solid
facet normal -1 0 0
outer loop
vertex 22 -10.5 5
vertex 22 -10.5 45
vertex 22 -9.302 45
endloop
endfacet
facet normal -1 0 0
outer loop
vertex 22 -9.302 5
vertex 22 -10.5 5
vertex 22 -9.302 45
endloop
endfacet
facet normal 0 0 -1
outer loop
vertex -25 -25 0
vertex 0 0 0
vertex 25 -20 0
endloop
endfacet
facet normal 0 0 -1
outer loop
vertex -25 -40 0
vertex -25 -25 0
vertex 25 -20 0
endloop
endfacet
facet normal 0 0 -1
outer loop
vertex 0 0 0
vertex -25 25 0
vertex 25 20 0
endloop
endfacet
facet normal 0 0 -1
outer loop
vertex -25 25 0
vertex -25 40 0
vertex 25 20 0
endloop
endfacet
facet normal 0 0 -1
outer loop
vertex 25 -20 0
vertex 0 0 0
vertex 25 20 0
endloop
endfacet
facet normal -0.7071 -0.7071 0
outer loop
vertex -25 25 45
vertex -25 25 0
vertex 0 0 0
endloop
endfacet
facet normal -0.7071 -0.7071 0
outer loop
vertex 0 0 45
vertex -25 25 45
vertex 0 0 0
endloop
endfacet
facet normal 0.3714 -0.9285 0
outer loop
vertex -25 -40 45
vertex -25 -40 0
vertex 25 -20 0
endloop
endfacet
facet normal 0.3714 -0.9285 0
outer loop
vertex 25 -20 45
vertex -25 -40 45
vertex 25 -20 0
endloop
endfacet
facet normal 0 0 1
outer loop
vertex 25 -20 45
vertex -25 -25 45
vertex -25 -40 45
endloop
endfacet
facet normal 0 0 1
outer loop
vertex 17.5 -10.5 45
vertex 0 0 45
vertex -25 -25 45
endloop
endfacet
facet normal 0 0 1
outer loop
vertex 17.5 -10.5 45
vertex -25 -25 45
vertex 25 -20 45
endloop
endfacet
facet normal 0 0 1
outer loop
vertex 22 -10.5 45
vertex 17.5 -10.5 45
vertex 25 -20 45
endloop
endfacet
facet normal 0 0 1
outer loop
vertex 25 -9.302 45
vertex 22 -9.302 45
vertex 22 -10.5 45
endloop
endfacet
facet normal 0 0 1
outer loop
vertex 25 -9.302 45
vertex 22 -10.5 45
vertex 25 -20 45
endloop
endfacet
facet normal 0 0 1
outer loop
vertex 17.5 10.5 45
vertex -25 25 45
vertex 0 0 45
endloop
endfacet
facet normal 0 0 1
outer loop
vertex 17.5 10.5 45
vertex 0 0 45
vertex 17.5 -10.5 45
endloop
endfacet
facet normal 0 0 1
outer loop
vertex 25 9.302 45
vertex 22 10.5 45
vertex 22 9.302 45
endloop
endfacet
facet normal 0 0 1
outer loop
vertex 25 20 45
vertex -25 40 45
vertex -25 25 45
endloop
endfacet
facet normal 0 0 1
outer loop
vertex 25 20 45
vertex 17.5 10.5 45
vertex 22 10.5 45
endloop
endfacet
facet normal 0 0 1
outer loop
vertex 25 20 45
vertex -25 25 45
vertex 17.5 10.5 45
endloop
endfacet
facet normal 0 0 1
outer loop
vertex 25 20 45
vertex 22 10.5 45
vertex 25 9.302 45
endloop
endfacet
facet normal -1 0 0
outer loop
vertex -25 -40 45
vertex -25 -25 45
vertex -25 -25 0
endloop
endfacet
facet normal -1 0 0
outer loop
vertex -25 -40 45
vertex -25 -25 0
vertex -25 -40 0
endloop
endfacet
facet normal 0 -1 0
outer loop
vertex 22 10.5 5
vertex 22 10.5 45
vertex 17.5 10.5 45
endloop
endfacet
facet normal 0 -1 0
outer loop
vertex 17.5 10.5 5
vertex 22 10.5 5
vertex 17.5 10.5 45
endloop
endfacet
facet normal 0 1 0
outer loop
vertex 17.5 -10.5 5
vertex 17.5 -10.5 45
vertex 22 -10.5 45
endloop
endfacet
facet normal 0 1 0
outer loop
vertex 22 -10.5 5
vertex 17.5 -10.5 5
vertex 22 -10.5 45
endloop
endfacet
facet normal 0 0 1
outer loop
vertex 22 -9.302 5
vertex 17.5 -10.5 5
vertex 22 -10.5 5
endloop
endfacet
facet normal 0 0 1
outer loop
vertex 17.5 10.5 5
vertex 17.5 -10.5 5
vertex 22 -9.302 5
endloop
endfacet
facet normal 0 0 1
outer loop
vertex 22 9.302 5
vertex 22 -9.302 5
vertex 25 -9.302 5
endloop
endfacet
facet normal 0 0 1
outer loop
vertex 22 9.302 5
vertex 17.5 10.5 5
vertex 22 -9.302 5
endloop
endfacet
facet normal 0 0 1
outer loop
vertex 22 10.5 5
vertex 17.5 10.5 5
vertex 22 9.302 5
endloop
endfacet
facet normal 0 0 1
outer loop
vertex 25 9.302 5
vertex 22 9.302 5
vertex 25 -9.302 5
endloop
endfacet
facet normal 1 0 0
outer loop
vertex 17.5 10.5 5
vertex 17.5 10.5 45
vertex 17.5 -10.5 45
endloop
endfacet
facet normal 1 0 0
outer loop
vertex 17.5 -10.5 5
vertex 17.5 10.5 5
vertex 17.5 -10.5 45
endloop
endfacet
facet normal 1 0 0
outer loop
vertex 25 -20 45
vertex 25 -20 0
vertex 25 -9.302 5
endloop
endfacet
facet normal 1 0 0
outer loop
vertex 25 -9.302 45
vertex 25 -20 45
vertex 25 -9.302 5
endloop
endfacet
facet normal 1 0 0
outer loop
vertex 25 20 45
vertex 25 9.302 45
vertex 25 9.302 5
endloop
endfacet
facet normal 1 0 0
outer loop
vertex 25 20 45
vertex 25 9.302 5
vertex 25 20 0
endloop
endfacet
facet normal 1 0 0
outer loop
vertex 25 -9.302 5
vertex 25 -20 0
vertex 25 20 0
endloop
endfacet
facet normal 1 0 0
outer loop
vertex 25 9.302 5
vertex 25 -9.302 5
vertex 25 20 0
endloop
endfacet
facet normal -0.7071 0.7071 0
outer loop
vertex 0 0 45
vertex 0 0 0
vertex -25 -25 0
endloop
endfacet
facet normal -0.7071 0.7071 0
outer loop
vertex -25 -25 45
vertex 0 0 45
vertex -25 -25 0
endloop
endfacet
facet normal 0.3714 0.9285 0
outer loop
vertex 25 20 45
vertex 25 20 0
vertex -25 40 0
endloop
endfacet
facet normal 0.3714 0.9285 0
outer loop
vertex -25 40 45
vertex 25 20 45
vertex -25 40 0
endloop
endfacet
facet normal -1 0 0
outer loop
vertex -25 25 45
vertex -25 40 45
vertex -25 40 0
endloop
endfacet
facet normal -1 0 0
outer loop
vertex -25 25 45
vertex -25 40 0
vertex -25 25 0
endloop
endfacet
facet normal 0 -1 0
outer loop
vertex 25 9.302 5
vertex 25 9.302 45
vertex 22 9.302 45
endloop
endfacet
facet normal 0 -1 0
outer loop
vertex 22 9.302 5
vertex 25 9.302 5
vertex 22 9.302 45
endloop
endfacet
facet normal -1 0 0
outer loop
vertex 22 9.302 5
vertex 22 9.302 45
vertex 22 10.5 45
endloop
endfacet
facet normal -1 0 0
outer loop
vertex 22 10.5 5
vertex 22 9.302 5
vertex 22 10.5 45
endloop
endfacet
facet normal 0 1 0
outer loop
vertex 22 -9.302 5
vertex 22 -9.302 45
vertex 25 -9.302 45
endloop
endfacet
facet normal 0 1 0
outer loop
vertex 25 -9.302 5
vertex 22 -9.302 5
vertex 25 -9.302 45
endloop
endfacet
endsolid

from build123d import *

# Parameters (mm, degrees)
PAD_DEPTH    = 45
POCKET_DEPTH = 40


with BuildPart() as part:
    # Sketch → Pad (new body)
    with BuildSketch(Plane.XY):
        Polygon((-25, 25), (0, 0), (-25, -25), (-25, -40), (25, -20), (25, 20), (-25, 40), align=None)
    extrude(amount=PAD_DEPTH)

    # Sketch001 (on Face9 of Pad) → Pocket (cut)
    with BuildSketch(Plane.XY.offset(45)):
        Polygon((25, 9.302202), (22, 9.302202), (22, 10.5), (17.5, 10.5), (17.5, -10.5), (22, -10.5), (22, -9.302202), (25, -9.302202), align=None)
    extrude(amount=-POCKET_DEPTH, mode=Mode.SUBTRACT)


solid = part.part
